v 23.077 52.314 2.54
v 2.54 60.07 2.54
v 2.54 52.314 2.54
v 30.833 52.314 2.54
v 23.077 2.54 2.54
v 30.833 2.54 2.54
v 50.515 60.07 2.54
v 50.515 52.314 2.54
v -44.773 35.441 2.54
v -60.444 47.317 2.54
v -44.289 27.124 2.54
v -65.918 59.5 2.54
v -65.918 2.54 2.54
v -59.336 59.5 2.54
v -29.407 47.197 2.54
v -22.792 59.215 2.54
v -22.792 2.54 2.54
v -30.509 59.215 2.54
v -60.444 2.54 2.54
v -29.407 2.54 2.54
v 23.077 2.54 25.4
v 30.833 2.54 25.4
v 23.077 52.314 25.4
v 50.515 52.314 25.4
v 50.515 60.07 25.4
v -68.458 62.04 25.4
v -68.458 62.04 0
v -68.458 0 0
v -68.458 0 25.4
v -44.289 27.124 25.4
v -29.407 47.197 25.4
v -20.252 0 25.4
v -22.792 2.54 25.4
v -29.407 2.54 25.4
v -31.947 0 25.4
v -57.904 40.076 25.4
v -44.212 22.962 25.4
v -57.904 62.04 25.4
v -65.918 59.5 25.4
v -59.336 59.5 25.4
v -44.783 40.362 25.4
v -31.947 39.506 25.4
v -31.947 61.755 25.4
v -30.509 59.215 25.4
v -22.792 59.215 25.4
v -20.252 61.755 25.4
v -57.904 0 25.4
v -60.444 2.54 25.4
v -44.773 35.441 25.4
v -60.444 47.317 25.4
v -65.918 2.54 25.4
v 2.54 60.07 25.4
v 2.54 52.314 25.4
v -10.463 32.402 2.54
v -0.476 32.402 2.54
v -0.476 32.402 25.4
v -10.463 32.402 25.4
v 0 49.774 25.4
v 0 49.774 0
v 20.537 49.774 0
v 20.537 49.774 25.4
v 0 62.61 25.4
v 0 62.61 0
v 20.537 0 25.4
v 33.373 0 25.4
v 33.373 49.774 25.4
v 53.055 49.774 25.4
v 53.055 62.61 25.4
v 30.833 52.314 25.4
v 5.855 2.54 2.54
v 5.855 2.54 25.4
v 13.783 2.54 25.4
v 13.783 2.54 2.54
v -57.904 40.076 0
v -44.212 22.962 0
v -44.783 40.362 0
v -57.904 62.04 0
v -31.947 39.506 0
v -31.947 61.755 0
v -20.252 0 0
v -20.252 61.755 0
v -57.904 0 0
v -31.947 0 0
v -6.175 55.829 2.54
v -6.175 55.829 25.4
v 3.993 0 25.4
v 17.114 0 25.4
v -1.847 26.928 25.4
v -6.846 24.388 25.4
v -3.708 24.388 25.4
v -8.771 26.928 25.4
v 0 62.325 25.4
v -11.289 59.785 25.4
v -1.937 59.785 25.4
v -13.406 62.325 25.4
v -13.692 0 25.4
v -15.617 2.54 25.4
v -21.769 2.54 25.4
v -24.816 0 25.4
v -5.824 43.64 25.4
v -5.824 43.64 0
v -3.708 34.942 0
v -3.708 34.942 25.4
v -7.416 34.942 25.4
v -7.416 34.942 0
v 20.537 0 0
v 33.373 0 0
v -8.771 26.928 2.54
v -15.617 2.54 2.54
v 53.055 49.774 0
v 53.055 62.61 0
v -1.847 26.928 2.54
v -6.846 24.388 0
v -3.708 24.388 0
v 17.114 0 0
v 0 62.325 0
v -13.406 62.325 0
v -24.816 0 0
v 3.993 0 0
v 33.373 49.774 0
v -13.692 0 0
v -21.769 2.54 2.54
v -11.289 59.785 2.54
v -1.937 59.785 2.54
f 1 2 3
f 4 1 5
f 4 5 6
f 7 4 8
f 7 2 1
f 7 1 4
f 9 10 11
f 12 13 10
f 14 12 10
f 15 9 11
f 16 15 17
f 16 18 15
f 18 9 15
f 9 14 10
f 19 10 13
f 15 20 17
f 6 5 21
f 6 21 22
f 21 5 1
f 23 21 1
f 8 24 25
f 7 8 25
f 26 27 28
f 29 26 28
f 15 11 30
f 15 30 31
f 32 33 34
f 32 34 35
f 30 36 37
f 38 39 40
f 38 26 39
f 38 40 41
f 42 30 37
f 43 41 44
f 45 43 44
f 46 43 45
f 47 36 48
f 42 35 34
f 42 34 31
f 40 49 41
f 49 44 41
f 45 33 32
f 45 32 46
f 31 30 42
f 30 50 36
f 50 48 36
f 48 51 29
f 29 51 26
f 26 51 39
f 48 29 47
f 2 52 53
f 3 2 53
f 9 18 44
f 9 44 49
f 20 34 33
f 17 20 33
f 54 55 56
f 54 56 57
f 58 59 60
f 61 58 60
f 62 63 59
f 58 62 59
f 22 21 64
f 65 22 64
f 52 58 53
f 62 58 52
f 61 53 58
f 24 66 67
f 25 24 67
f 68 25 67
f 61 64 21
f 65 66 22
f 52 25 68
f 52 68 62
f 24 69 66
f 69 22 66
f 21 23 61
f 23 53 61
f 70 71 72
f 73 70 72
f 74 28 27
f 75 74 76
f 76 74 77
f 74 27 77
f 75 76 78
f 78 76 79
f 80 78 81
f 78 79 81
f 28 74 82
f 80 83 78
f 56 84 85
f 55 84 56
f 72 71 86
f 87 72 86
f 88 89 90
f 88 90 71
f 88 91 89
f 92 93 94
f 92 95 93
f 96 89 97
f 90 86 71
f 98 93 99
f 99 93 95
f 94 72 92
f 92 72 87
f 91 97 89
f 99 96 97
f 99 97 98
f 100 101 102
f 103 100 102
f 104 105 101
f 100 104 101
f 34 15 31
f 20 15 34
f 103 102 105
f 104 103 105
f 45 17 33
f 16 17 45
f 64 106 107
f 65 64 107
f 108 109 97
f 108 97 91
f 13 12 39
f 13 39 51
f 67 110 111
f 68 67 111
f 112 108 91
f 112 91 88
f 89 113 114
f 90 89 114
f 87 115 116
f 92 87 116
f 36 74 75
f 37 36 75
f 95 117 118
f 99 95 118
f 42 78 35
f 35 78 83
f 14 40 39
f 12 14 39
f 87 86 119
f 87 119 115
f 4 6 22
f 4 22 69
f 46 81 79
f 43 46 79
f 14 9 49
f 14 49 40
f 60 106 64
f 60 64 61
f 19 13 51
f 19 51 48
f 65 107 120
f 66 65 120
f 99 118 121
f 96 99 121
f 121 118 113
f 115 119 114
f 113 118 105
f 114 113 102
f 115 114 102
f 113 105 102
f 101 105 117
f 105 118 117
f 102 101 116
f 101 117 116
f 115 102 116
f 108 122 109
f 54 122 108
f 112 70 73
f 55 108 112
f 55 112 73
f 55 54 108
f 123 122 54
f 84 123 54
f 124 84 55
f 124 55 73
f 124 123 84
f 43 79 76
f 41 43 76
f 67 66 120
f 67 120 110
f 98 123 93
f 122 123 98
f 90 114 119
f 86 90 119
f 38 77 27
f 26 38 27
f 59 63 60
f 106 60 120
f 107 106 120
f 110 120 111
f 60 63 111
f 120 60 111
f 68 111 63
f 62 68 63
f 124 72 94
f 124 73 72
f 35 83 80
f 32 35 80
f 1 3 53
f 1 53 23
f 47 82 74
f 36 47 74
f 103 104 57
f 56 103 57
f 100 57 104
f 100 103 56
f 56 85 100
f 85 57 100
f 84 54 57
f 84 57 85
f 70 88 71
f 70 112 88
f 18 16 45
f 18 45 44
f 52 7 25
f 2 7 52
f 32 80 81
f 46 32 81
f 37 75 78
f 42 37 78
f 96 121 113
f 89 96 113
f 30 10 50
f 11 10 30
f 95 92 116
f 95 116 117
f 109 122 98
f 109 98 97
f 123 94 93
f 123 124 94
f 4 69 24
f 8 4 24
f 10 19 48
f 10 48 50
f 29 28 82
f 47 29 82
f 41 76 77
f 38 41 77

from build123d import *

# Parameters (mm, degrees)
F3_DEPTH = 25.4
F2_W     = 12.8358323127
F2_H     = 49.7744940221
F4_T     = -2.54
F4_2_T   = -2.54
F4_3_T   = -2.54


with BuildPart() as f3:
    # F0 (on Top) → F3 (new body)
    with BuildSketch(Plane.XY):
        Polygon((-44.7827801108, 40.3615534306), (-57.9038485885, 62.0398409665), (-57.9038485885, 40.0763116777), (-44.2123003304, 22.9618716985), (-31.9469533861, 39.5058318973), (-31.9469533861, 61.7545992136), align=None)
        Polygon((-57.9038485885, 62.0398409665), (-68.4577524662, 62.0398409665), (-68.4577524662, 0), (-57.9038485885, 0), (-57.9038485885, 40.0763116777), align=None)
        Polygon((-20.2520862222, 61.7545992136), (-31.9469533861, 61.7545992136), (-31.9469533861, 39.5058318973), (-31.9469533861, 0), (-20.2520862222, 0), align=None)
    extrude(amount=F3_DEPTH)

    # F4
    f4_openings = [f3.faces().sort_by_distance(p)[0] for p in [
        (-44.0268, 33.845285, 25.4),
    ]]
    offset(amount=F4_T, openings=f4_openings, kind=Kind.INTERSECTION)


with BuildPart() as f3b:
    # F1 (on Top) → F3, piece 2 (new body)
    with BuildSketch(Plane.XY):
        Polygon((-13.4063102305, 62.325078994), (-24.8159356415, 0), (-13.691551052, 0), (-6.845775526, 24.3880767375), (-3.7081290502, 24.3880767375), (3.9933696389, 0), (17.1144381166, 0), (0, 62.325078994), align=None)
        Polygon((-7.4162567034, 34.9419787526), (-5.8239077568, 43.6401848994), (-3.7081290502, 34.9419787526), align=None, mode=Mode.SUBTRACT)
    extrude(amount=F3_DEPTH)

    # F4#2
    f4_2_openings = [f3b.faces().sort_by_distance(p)[0] for p in [
        (-5.028317, 28.547265, 25.4),
    ]]
    offset(amount=F4_2_T, openings=f4_2_openings, kind=Kind.INTERSECTION)


with BuildPart() as f3c:
    # F2 (on Top) → F3, piece 3 (new body)
    with BuildSketch(Plane.XY):
        Polygon((53.0547574162, 62.6103207469), (0, 62.6103207469), (0, 49.7744940221), (20.5373261124, 49.7744940221), (33.3731584251, 49.7744940221), (53.0547574162, 49.7744940221), align=None)
        with Locations((26.9552422687, 24.8872470111)):
            Rectangle(F2_W, F2_H)
    extrude(amount=F3_DEPTH)

    # F4#3
    f4_3_openings = [f3c.faces().sort_by_distance(p)[0] for p in [
        (26.734486, 41.039143, 25.4),
    ]]
    offset(amount=F4_3_T, openings=f4_3_openings, kind=Kind.INTERSECTION)


solid = Compound([f3.part, f3b.part, f3c.part])
